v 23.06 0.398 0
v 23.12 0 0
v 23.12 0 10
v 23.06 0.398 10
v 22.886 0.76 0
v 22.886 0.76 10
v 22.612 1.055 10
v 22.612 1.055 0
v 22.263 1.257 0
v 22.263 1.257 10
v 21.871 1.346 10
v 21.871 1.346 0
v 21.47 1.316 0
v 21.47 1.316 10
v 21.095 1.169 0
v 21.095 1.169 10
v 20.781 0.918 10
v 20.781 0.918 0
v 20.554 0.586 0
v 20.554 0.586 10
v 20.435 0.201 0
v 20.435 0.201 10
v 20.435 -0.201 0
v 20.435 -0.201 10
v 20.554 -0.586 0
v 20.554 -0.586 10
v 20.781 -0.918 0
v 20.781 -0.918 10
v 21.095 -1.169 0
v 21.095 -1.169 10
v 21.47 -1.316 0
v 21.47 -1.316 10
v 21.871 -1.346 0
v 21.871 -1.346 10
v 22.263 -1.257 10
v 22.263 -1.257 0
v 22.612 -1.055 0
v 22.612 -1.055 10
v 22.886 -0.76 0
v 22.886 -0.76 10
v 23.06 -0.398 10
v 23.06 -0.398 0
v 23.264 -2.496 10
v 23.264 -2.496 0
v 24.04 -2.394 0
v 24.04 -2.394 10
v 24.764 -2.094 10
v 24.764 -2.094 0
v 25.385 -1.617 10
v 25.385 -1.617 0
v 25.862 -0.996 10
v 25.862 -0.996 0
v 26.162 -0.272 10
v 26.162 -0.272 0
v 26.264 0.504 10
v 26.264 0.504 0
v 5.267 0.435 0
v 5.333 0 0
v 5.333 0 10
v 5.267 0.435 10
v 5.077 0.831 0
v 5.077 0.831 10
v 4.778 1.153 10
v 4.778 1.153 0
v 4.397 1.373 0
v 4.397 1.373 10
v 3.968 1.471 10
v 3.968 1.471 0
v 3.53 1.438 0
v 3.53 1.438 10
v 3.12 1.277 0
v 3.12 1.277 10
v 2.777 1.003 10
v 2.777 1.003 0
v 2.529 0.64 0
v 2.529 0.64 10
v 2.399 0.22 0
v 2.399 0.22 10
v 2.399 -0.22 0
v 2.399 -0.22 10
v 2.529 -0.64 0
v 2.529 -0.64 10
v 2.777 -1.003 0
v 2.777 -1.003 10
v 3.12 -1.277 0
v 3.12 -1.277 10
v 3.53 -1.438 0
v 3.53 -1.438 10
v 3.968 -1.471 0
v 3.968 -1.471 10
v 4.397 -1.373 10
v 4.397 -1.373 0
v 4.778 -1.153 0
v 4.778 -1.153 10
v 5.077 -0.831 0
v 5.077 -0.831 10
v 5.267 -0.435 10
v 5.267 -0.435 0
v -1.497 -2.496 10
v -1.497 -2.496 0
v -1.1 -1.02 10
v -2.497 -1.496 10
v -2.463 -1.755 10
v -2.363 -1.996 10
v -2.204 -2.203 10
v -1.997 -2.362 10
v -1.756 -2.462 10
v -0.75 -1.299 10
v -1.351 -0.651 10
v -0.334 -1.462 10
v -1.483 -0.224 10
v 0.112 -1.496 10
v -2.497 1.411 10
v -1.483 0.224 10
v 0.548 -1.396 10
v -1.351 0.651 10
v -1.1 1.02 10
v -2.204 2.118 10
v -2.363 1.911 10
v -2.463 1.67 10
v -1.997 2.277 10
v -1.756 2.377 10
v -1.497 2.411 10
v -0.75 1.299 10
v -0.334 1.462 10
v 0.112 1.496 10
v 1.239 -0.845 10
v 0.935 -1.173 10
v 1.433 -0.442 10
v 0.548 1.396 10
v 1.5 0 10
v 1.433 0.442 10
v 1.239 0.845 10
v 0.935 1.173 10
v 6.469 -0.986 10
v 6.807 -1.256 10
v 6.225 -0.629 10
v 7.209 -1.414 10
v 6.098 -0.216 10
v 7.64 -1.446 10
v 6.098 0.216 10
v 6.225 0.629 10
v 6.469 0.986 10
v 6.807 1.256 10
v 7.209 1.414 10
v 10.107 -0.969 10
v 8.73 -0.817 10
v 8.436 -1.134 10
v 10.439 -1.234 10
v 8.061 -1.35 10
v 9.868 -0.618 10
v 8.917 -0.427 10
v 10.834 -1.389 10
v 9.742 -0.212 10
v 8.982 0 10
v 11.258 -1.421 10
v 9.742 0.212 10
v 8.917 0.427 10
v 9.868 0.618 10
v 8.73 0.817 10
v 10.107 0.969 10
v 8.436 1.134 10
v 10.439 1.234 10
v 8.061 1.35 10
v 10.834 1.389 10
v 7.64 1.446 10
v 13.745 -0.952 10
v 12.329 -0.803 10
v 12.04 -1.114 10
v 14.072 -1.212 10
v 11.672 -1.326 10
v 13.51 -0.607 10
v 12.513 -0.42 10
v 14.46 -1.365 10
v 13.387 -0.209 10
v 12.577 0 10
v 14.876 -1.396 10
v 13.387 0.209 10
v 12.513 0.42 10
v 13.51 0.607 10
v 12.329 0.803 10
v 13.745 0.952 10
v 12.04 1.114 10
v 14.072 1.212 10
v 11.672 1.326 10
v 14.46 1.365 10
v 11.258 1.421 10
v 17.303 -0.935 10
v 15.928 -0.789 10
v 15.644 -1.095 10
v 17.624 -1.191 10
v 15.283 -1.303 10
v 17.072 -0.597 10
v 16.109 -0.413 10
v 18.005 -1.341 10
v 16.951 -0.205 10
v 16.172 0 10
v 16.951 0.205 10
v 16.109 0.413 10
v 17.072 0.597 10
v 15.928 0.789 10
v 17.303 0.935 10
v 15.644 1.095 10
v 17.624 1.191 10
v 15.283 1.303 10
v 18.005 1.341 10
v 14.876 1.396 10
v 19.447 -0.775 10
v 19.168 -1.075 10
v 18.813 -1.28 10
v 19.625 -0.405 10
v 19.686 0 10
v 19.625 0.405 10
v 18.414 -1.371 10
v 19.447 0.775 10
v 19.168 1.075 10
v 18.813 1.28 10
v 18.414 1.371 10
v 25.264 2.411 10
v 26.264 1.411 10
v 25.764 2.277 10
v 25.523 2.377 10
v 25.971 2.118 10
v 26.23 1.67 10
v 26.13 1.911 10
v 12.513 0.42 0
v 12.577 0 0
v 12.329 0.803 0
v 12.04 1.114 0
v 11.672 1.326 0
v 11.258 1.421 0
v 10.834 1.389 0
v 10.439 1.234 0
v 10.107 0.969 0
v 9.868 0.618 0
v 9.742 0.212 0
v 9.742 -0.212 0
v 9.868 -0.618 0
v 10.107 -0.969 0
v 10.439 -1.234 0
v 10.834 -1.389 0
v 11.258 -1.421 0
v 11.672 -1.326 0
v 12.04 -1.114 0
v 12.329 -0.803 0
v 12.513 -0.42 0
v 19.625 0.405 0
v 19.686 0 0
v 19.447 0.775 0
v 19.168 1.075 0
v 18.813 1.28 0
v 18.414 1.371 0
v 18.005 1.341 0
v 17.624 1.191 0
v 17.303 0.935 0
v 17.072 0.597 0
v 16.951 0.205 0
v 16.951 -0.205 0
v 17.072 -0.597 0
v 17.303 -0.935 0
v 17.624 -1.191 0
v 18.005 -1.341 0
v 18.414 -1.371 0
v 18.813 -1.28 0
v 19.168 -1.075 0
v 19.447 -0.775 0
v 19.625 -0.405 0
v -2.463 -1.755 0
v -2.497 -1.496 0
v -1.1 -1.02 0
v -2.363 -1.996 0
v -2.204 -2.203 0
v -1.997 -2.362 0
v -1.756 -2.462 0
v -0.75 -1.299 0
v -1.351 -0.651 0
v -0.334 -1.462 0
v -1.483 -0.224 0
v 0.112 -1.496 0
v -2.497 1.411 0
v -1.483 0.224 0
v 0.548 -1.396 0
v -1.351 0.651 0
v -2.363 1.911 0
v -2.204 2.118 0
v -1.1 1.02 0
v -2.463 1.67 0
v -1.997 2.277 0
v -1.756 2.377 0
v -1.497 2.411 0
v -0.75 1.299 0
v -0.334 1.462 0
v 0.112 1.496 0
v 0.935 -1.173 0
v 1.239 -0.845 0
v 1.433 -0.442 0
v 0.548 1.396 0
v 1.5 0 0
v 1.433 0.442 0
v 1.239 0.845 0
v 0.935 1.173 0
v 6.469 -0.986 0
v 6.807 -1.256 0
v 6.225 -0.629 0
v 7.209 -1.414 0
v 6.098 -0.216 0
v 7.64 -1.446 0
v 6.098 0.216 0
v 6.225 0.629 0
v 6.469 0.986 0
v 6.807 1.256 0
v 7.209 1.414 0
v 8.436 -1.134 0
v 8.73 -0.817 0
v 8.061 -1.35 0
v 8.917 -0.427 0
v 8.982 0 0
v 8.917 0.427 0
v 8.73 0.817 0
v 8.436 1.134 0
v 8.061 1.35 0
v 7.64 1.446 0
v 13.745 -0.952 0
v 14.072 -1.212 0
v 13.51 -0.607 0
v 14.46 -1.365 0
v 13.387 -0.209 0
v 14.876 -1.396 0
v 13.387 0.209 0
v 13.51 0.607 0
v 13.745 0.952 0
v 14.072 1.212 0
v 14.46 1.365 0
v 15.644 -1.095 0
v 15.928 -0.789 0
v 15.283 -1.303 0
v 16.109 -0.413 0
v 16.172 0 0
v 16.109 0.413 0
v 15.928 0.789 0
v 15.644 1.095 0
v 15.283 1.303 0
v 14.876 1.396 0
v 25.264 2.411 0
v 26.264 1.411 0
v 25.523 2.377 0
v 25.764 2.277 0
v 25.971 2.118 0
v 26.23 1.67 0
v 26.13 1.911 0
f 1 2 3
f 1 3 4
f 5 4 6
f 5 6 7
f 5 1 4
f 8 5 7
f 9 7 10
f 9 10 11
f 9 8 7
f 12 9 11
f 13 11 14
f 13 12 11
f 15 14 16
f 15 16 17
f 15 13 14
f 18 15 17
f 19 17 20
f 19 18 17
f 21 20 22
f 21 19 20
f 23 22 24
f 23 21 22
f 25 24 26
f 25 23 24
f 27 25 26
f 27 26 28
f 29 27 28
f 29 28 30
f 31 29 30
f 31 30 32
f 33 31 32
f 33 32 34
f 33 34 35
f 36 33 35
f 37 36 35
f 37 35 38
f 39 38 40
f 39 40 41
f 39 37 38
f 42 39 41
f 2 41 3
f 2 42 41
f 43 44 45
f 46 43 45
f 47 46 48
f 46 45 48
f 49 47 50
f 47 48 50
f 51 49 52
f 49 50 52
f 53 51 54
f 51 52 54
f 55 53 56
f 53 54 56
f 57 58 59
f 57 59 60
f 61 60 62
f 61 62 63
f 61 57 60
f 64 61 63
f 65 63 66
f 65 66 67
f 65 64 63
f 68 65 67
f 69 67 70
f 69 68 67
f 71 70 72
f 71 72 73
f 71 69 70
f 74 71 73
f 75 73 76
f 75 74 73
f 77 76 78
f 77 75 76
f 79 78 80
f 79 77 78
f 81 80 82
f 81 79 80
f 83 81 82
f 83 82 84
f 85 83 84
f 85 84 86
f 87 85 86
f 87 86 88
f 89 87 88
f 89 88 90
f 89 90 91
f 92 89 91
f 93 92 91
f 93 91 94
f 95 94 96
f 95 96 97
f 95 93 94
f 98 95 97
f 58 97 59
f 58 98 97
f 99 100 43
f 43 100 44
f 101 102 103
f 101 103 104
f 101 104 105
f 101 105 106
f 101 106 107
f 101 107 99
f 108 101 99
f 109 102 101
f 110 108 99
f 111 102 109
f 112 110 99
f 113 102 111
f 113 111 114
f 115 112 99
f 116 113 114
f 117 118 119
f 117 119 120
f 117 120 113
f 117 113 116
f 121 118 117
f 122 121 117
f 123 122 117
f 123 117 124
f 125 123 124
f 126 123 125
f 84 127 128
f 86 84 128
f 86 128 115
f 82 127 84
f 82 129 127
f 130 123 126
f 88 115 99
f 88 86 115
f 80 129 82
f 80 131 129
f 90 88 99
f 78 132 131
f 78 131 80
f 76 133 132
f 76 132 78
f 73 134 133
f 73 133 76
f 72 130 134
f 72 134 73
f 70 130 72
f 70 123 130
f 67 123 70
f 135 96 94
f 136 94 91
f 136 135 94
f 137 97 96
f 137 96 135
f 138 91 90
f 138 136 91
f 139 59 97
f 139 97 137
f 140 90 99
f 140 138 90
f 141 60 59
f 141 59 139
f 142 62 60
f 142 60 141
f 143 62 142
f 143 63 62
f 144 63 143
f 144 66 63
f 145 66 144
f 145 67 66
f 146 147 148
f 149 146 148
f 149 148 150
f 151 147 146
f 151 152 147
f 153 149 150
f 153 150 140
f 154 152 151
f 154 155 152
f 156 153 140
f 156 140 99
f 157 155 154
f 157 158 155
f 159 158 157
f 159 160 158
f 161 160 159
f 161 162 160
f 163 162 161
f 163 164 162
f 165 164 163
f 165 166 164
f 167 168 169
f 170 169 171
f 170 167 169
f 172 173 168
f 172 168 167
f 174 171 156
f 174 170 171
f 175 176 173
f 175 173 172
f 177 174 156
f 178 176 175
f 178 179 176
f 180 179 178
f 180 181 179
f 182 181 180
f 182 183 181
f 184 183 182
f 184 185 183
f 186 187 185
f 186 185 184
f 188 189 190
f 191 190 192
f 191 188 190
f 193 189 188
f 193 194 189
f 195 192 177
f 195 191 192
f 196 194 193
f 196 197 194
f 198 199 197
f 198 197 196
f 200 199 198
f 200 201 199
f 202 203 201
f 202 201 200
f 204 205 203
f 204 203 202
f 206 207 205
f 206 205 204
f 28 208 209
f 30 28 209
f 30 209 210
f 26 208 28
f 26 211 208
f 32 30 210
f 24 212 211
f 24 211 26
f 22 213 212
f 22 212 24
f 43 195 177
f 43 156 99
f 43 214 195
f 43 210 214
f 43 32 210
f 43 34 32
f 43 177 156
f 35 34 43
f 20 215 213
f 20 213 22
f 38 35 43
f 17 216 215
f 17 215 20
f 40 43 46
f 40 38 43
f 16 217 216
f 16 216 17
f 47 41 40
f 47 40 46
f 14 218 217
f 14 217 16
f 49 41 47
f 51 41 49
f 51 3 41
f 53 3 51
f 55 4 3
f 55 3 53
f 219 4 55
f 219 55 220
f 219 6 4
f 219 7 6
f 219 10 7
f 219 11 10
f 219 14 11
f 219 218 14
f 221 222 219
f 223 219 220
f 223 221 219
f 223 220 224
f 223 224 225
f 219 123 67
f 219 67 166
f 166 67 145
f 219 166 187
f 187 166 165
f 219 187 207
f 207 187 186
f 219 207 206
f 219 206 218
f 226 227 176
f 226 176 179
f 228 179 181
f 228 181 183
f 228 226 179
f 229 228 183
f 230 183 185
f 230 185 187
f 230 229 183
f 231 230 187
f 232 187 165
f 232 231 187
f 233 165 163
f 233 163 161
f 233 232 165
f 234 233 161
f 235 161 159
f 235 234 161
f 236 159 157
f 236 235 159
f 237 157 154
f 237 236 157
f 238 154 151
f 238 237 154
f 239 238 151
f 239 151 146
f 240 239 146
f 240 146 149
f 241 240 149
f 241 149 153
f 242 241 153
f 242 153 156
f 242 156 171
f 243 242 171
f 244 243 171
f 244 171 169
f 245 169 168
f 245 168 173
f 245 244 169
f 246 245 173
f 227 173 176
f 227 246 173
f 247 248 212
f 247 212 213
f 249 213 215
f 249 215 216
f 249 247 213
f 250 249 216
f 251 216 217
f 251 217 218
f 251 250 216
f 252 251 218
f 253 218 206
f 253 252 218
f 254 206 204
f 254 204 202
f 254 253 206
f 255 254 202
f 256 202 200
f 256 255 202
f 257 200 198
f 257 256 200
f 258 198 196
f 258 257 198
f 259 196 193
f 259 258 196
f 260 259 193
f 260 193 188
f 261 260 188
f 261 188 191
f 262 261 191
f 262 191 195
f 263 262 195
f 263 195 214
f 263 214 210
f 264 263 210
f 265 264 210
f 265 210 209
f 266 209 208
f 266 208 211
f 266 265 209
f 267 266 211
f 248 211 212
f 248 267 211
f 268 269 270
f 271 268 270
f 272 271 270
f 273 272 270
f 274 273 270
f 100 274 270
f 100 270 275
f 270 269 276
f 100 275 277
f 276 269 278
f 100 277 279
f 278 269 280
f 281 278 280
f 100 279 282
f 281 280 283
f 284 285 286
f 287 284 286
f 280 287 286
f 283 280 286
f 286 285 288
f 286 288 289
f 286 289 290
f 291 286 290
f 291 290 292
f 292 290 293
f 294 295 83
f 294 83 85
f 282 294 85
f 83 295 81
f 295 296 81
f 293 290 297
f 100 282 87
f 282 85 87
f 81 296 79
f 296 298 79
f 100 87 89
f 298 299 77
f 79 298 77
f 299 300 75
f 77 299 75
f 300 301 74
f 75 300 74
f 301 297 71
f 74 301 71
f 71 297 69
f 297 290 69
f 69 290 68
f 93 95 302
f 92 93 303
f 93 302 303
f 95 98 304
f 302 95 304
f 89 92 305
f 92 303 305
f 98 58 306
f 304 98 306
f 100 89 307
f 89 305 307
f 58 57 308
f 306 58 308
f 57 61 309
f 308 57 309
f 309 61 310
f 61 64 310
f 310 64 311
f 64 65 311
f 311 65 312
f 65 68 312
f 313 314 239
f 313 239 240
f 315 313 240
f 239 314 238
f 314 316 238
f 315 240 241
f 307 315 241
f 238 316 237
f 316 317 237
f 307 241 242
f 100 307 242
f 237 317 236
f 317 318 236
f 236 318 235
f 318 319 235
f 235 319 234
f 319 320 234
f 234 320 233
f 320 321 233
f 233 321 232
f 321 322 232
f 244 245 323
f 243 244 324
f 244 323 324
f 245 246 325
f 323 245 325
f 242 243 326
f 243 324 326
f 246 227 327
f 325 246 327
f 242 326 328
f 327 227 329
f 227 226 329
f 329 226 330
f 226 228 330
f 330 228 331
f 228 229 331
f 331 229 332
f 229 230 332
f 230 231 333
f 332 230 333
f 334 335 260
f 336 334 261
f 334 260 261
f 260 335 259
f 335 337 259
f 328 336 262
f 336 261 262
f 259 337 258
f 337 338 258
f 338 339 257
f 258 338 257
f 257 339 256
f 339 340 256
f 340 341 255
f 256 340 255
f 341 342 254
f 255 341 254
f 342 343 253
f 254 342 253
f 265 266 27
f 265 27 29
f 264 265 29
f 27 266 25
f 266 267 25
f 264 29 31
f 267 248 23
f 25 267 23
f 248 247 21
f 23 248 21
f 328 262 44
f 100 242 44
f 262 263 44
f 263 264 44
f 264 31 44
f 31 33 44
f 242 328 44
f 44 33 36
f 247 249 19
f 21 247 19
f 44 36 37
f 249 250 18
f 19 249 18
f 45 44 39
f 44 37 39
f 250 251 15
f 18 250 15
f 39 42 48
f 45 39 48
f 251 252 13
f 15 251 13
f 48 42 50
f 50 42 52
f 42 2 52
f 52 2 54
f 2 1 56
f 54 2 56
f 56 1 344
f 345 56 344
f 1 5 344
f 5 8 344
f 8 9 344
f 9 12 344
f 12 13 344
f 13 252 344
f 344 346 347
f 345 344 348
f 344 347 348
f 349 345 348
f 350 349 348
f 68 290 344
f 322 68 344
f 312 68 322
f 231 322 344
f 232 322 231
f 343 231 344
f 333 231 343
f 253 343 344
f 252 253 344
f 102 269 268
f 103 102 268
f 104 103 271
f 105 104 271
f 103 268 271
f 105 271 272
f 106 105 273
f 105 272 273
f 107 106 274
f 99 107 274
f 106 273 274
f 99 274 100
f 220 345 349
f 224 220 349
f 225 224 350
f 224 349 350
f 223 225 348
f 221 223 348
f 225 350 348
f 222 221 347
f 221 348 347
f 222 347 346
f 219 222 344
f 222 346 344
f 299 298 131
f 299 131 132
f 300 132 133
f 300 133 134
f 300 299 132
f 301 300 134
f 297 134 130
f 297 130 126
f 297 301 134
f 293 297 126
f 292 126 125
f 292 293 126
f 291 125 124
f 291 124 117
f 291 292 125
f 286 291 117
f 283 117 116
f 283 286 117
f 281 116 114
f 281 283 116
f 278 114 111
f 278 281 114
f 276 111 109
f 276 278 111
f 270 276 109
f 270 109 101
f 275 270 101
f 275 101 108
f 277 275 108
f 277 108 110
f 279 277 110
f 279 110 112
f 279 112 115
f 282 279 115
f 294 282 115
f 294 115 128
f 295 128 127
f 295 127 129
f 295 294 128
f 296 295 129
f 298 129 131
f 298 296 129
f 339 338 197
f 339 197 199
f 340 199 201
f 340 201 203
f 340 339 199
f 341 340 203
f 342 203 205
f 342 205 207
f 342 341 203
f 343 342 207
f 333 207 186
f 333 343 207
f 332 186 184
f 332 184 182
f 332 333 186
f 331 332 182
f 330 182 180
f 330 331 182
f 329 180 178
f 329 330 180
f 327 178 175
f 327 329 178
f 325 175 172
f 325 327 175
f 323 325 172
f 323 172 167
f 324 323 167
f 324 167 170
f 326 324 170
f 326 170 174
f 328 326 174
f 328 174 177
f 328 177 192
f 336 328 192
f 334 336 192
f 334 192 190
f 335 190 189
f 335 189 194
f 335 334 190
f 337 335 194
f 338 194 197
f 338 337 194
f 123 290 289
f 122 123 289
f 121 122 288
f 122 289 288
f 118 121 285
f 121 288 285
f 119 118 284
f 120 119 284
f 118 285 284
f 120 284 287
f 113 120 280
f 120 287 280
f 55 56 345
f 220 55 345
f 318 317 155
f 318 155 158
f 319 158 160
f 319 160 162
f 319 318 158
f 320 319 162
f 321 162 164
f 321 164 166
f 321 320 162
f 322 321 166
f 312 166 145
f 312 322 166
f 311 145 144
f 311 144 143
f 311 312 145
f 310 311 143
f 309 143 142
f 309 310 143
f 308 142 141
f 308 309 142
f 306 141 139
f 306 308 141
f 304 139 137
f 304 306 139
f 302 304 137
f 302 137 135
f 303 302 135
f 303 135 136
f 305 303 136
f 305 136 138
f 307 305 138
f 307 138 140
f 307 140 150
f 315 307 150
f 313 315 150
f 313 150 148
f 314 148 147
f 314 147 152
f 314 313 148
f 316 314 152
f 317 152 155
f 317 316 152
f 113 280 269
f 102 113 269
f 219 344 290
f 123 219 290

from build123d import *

# Parameters (mm, degrees)
F0_R     = 1.5
F0_R_2   = 1.475
F0_R_3   = 1.45
F0_R_4   = 1.425
F0_R_5   = 1.4
F0_R_6   = 1.375
F0_R_7   = 1.35
F1_DEPTH = 10


with BuildPart() as f1:
    # F0 (on Top) → F1 (new body)
    with BuildSketch(Plane.XY):
        with BuildLine():
            Line((25.263883, 2.41127), (-1.497099, 2.41127))
            ThreePointArc((-1.497099, 2.41127), (-2.204206, 2.118377), (-2.497099, 1.41127))
            Line((-2.497099, 1.41127), (-2.497099, -1.495804))
            ThreePointArc((-2.497099, -1.495804), (-2.204206, -2.202911), (-1.497099, -2.495804))
            Line((-1.497099, -2.495804), (23.263883, -2.495804))
            ThreePointArc((23.263883, -2.495804), (25.385203, -1.617124), (26.263883, 0.504196))
            Line((26.263883, 0.504196), (26.263883, 1.41127))
            ThreePointArc((26.263883, 1.41127), (25.97099, 2.118377), (25.263883, 2.41127))
        make_face()
        Circle(F0_R, mode=Mode.SUBTRACT)
        with Locations((3.857963, 0)):
            Circle(F0_R_2, mode=Mode.SUBTRACT)
        with Locations((7.531565, 0)):
            Circle(F0_R_3, mode=Mode.SUBTRACT)
        with Locations((11.151538, 0)):
            Circle(F0_R_4, mode=Mode.SUBTRACT)
        with Locations((14.771511, 0)):
            Circle(F0_R_5, mode=Mode.SUBTRACT)
        with Locations((18.311039, 0)):
            Circle(F0_R_6, mode=Mode.SUBTRACT)
        with Locations((21.770123, 0)):
            Circle(F0_R_7, mode=Mode.SUBTRACT)
    extrude(amount=F1_DEPTH)


solid = f1.part
